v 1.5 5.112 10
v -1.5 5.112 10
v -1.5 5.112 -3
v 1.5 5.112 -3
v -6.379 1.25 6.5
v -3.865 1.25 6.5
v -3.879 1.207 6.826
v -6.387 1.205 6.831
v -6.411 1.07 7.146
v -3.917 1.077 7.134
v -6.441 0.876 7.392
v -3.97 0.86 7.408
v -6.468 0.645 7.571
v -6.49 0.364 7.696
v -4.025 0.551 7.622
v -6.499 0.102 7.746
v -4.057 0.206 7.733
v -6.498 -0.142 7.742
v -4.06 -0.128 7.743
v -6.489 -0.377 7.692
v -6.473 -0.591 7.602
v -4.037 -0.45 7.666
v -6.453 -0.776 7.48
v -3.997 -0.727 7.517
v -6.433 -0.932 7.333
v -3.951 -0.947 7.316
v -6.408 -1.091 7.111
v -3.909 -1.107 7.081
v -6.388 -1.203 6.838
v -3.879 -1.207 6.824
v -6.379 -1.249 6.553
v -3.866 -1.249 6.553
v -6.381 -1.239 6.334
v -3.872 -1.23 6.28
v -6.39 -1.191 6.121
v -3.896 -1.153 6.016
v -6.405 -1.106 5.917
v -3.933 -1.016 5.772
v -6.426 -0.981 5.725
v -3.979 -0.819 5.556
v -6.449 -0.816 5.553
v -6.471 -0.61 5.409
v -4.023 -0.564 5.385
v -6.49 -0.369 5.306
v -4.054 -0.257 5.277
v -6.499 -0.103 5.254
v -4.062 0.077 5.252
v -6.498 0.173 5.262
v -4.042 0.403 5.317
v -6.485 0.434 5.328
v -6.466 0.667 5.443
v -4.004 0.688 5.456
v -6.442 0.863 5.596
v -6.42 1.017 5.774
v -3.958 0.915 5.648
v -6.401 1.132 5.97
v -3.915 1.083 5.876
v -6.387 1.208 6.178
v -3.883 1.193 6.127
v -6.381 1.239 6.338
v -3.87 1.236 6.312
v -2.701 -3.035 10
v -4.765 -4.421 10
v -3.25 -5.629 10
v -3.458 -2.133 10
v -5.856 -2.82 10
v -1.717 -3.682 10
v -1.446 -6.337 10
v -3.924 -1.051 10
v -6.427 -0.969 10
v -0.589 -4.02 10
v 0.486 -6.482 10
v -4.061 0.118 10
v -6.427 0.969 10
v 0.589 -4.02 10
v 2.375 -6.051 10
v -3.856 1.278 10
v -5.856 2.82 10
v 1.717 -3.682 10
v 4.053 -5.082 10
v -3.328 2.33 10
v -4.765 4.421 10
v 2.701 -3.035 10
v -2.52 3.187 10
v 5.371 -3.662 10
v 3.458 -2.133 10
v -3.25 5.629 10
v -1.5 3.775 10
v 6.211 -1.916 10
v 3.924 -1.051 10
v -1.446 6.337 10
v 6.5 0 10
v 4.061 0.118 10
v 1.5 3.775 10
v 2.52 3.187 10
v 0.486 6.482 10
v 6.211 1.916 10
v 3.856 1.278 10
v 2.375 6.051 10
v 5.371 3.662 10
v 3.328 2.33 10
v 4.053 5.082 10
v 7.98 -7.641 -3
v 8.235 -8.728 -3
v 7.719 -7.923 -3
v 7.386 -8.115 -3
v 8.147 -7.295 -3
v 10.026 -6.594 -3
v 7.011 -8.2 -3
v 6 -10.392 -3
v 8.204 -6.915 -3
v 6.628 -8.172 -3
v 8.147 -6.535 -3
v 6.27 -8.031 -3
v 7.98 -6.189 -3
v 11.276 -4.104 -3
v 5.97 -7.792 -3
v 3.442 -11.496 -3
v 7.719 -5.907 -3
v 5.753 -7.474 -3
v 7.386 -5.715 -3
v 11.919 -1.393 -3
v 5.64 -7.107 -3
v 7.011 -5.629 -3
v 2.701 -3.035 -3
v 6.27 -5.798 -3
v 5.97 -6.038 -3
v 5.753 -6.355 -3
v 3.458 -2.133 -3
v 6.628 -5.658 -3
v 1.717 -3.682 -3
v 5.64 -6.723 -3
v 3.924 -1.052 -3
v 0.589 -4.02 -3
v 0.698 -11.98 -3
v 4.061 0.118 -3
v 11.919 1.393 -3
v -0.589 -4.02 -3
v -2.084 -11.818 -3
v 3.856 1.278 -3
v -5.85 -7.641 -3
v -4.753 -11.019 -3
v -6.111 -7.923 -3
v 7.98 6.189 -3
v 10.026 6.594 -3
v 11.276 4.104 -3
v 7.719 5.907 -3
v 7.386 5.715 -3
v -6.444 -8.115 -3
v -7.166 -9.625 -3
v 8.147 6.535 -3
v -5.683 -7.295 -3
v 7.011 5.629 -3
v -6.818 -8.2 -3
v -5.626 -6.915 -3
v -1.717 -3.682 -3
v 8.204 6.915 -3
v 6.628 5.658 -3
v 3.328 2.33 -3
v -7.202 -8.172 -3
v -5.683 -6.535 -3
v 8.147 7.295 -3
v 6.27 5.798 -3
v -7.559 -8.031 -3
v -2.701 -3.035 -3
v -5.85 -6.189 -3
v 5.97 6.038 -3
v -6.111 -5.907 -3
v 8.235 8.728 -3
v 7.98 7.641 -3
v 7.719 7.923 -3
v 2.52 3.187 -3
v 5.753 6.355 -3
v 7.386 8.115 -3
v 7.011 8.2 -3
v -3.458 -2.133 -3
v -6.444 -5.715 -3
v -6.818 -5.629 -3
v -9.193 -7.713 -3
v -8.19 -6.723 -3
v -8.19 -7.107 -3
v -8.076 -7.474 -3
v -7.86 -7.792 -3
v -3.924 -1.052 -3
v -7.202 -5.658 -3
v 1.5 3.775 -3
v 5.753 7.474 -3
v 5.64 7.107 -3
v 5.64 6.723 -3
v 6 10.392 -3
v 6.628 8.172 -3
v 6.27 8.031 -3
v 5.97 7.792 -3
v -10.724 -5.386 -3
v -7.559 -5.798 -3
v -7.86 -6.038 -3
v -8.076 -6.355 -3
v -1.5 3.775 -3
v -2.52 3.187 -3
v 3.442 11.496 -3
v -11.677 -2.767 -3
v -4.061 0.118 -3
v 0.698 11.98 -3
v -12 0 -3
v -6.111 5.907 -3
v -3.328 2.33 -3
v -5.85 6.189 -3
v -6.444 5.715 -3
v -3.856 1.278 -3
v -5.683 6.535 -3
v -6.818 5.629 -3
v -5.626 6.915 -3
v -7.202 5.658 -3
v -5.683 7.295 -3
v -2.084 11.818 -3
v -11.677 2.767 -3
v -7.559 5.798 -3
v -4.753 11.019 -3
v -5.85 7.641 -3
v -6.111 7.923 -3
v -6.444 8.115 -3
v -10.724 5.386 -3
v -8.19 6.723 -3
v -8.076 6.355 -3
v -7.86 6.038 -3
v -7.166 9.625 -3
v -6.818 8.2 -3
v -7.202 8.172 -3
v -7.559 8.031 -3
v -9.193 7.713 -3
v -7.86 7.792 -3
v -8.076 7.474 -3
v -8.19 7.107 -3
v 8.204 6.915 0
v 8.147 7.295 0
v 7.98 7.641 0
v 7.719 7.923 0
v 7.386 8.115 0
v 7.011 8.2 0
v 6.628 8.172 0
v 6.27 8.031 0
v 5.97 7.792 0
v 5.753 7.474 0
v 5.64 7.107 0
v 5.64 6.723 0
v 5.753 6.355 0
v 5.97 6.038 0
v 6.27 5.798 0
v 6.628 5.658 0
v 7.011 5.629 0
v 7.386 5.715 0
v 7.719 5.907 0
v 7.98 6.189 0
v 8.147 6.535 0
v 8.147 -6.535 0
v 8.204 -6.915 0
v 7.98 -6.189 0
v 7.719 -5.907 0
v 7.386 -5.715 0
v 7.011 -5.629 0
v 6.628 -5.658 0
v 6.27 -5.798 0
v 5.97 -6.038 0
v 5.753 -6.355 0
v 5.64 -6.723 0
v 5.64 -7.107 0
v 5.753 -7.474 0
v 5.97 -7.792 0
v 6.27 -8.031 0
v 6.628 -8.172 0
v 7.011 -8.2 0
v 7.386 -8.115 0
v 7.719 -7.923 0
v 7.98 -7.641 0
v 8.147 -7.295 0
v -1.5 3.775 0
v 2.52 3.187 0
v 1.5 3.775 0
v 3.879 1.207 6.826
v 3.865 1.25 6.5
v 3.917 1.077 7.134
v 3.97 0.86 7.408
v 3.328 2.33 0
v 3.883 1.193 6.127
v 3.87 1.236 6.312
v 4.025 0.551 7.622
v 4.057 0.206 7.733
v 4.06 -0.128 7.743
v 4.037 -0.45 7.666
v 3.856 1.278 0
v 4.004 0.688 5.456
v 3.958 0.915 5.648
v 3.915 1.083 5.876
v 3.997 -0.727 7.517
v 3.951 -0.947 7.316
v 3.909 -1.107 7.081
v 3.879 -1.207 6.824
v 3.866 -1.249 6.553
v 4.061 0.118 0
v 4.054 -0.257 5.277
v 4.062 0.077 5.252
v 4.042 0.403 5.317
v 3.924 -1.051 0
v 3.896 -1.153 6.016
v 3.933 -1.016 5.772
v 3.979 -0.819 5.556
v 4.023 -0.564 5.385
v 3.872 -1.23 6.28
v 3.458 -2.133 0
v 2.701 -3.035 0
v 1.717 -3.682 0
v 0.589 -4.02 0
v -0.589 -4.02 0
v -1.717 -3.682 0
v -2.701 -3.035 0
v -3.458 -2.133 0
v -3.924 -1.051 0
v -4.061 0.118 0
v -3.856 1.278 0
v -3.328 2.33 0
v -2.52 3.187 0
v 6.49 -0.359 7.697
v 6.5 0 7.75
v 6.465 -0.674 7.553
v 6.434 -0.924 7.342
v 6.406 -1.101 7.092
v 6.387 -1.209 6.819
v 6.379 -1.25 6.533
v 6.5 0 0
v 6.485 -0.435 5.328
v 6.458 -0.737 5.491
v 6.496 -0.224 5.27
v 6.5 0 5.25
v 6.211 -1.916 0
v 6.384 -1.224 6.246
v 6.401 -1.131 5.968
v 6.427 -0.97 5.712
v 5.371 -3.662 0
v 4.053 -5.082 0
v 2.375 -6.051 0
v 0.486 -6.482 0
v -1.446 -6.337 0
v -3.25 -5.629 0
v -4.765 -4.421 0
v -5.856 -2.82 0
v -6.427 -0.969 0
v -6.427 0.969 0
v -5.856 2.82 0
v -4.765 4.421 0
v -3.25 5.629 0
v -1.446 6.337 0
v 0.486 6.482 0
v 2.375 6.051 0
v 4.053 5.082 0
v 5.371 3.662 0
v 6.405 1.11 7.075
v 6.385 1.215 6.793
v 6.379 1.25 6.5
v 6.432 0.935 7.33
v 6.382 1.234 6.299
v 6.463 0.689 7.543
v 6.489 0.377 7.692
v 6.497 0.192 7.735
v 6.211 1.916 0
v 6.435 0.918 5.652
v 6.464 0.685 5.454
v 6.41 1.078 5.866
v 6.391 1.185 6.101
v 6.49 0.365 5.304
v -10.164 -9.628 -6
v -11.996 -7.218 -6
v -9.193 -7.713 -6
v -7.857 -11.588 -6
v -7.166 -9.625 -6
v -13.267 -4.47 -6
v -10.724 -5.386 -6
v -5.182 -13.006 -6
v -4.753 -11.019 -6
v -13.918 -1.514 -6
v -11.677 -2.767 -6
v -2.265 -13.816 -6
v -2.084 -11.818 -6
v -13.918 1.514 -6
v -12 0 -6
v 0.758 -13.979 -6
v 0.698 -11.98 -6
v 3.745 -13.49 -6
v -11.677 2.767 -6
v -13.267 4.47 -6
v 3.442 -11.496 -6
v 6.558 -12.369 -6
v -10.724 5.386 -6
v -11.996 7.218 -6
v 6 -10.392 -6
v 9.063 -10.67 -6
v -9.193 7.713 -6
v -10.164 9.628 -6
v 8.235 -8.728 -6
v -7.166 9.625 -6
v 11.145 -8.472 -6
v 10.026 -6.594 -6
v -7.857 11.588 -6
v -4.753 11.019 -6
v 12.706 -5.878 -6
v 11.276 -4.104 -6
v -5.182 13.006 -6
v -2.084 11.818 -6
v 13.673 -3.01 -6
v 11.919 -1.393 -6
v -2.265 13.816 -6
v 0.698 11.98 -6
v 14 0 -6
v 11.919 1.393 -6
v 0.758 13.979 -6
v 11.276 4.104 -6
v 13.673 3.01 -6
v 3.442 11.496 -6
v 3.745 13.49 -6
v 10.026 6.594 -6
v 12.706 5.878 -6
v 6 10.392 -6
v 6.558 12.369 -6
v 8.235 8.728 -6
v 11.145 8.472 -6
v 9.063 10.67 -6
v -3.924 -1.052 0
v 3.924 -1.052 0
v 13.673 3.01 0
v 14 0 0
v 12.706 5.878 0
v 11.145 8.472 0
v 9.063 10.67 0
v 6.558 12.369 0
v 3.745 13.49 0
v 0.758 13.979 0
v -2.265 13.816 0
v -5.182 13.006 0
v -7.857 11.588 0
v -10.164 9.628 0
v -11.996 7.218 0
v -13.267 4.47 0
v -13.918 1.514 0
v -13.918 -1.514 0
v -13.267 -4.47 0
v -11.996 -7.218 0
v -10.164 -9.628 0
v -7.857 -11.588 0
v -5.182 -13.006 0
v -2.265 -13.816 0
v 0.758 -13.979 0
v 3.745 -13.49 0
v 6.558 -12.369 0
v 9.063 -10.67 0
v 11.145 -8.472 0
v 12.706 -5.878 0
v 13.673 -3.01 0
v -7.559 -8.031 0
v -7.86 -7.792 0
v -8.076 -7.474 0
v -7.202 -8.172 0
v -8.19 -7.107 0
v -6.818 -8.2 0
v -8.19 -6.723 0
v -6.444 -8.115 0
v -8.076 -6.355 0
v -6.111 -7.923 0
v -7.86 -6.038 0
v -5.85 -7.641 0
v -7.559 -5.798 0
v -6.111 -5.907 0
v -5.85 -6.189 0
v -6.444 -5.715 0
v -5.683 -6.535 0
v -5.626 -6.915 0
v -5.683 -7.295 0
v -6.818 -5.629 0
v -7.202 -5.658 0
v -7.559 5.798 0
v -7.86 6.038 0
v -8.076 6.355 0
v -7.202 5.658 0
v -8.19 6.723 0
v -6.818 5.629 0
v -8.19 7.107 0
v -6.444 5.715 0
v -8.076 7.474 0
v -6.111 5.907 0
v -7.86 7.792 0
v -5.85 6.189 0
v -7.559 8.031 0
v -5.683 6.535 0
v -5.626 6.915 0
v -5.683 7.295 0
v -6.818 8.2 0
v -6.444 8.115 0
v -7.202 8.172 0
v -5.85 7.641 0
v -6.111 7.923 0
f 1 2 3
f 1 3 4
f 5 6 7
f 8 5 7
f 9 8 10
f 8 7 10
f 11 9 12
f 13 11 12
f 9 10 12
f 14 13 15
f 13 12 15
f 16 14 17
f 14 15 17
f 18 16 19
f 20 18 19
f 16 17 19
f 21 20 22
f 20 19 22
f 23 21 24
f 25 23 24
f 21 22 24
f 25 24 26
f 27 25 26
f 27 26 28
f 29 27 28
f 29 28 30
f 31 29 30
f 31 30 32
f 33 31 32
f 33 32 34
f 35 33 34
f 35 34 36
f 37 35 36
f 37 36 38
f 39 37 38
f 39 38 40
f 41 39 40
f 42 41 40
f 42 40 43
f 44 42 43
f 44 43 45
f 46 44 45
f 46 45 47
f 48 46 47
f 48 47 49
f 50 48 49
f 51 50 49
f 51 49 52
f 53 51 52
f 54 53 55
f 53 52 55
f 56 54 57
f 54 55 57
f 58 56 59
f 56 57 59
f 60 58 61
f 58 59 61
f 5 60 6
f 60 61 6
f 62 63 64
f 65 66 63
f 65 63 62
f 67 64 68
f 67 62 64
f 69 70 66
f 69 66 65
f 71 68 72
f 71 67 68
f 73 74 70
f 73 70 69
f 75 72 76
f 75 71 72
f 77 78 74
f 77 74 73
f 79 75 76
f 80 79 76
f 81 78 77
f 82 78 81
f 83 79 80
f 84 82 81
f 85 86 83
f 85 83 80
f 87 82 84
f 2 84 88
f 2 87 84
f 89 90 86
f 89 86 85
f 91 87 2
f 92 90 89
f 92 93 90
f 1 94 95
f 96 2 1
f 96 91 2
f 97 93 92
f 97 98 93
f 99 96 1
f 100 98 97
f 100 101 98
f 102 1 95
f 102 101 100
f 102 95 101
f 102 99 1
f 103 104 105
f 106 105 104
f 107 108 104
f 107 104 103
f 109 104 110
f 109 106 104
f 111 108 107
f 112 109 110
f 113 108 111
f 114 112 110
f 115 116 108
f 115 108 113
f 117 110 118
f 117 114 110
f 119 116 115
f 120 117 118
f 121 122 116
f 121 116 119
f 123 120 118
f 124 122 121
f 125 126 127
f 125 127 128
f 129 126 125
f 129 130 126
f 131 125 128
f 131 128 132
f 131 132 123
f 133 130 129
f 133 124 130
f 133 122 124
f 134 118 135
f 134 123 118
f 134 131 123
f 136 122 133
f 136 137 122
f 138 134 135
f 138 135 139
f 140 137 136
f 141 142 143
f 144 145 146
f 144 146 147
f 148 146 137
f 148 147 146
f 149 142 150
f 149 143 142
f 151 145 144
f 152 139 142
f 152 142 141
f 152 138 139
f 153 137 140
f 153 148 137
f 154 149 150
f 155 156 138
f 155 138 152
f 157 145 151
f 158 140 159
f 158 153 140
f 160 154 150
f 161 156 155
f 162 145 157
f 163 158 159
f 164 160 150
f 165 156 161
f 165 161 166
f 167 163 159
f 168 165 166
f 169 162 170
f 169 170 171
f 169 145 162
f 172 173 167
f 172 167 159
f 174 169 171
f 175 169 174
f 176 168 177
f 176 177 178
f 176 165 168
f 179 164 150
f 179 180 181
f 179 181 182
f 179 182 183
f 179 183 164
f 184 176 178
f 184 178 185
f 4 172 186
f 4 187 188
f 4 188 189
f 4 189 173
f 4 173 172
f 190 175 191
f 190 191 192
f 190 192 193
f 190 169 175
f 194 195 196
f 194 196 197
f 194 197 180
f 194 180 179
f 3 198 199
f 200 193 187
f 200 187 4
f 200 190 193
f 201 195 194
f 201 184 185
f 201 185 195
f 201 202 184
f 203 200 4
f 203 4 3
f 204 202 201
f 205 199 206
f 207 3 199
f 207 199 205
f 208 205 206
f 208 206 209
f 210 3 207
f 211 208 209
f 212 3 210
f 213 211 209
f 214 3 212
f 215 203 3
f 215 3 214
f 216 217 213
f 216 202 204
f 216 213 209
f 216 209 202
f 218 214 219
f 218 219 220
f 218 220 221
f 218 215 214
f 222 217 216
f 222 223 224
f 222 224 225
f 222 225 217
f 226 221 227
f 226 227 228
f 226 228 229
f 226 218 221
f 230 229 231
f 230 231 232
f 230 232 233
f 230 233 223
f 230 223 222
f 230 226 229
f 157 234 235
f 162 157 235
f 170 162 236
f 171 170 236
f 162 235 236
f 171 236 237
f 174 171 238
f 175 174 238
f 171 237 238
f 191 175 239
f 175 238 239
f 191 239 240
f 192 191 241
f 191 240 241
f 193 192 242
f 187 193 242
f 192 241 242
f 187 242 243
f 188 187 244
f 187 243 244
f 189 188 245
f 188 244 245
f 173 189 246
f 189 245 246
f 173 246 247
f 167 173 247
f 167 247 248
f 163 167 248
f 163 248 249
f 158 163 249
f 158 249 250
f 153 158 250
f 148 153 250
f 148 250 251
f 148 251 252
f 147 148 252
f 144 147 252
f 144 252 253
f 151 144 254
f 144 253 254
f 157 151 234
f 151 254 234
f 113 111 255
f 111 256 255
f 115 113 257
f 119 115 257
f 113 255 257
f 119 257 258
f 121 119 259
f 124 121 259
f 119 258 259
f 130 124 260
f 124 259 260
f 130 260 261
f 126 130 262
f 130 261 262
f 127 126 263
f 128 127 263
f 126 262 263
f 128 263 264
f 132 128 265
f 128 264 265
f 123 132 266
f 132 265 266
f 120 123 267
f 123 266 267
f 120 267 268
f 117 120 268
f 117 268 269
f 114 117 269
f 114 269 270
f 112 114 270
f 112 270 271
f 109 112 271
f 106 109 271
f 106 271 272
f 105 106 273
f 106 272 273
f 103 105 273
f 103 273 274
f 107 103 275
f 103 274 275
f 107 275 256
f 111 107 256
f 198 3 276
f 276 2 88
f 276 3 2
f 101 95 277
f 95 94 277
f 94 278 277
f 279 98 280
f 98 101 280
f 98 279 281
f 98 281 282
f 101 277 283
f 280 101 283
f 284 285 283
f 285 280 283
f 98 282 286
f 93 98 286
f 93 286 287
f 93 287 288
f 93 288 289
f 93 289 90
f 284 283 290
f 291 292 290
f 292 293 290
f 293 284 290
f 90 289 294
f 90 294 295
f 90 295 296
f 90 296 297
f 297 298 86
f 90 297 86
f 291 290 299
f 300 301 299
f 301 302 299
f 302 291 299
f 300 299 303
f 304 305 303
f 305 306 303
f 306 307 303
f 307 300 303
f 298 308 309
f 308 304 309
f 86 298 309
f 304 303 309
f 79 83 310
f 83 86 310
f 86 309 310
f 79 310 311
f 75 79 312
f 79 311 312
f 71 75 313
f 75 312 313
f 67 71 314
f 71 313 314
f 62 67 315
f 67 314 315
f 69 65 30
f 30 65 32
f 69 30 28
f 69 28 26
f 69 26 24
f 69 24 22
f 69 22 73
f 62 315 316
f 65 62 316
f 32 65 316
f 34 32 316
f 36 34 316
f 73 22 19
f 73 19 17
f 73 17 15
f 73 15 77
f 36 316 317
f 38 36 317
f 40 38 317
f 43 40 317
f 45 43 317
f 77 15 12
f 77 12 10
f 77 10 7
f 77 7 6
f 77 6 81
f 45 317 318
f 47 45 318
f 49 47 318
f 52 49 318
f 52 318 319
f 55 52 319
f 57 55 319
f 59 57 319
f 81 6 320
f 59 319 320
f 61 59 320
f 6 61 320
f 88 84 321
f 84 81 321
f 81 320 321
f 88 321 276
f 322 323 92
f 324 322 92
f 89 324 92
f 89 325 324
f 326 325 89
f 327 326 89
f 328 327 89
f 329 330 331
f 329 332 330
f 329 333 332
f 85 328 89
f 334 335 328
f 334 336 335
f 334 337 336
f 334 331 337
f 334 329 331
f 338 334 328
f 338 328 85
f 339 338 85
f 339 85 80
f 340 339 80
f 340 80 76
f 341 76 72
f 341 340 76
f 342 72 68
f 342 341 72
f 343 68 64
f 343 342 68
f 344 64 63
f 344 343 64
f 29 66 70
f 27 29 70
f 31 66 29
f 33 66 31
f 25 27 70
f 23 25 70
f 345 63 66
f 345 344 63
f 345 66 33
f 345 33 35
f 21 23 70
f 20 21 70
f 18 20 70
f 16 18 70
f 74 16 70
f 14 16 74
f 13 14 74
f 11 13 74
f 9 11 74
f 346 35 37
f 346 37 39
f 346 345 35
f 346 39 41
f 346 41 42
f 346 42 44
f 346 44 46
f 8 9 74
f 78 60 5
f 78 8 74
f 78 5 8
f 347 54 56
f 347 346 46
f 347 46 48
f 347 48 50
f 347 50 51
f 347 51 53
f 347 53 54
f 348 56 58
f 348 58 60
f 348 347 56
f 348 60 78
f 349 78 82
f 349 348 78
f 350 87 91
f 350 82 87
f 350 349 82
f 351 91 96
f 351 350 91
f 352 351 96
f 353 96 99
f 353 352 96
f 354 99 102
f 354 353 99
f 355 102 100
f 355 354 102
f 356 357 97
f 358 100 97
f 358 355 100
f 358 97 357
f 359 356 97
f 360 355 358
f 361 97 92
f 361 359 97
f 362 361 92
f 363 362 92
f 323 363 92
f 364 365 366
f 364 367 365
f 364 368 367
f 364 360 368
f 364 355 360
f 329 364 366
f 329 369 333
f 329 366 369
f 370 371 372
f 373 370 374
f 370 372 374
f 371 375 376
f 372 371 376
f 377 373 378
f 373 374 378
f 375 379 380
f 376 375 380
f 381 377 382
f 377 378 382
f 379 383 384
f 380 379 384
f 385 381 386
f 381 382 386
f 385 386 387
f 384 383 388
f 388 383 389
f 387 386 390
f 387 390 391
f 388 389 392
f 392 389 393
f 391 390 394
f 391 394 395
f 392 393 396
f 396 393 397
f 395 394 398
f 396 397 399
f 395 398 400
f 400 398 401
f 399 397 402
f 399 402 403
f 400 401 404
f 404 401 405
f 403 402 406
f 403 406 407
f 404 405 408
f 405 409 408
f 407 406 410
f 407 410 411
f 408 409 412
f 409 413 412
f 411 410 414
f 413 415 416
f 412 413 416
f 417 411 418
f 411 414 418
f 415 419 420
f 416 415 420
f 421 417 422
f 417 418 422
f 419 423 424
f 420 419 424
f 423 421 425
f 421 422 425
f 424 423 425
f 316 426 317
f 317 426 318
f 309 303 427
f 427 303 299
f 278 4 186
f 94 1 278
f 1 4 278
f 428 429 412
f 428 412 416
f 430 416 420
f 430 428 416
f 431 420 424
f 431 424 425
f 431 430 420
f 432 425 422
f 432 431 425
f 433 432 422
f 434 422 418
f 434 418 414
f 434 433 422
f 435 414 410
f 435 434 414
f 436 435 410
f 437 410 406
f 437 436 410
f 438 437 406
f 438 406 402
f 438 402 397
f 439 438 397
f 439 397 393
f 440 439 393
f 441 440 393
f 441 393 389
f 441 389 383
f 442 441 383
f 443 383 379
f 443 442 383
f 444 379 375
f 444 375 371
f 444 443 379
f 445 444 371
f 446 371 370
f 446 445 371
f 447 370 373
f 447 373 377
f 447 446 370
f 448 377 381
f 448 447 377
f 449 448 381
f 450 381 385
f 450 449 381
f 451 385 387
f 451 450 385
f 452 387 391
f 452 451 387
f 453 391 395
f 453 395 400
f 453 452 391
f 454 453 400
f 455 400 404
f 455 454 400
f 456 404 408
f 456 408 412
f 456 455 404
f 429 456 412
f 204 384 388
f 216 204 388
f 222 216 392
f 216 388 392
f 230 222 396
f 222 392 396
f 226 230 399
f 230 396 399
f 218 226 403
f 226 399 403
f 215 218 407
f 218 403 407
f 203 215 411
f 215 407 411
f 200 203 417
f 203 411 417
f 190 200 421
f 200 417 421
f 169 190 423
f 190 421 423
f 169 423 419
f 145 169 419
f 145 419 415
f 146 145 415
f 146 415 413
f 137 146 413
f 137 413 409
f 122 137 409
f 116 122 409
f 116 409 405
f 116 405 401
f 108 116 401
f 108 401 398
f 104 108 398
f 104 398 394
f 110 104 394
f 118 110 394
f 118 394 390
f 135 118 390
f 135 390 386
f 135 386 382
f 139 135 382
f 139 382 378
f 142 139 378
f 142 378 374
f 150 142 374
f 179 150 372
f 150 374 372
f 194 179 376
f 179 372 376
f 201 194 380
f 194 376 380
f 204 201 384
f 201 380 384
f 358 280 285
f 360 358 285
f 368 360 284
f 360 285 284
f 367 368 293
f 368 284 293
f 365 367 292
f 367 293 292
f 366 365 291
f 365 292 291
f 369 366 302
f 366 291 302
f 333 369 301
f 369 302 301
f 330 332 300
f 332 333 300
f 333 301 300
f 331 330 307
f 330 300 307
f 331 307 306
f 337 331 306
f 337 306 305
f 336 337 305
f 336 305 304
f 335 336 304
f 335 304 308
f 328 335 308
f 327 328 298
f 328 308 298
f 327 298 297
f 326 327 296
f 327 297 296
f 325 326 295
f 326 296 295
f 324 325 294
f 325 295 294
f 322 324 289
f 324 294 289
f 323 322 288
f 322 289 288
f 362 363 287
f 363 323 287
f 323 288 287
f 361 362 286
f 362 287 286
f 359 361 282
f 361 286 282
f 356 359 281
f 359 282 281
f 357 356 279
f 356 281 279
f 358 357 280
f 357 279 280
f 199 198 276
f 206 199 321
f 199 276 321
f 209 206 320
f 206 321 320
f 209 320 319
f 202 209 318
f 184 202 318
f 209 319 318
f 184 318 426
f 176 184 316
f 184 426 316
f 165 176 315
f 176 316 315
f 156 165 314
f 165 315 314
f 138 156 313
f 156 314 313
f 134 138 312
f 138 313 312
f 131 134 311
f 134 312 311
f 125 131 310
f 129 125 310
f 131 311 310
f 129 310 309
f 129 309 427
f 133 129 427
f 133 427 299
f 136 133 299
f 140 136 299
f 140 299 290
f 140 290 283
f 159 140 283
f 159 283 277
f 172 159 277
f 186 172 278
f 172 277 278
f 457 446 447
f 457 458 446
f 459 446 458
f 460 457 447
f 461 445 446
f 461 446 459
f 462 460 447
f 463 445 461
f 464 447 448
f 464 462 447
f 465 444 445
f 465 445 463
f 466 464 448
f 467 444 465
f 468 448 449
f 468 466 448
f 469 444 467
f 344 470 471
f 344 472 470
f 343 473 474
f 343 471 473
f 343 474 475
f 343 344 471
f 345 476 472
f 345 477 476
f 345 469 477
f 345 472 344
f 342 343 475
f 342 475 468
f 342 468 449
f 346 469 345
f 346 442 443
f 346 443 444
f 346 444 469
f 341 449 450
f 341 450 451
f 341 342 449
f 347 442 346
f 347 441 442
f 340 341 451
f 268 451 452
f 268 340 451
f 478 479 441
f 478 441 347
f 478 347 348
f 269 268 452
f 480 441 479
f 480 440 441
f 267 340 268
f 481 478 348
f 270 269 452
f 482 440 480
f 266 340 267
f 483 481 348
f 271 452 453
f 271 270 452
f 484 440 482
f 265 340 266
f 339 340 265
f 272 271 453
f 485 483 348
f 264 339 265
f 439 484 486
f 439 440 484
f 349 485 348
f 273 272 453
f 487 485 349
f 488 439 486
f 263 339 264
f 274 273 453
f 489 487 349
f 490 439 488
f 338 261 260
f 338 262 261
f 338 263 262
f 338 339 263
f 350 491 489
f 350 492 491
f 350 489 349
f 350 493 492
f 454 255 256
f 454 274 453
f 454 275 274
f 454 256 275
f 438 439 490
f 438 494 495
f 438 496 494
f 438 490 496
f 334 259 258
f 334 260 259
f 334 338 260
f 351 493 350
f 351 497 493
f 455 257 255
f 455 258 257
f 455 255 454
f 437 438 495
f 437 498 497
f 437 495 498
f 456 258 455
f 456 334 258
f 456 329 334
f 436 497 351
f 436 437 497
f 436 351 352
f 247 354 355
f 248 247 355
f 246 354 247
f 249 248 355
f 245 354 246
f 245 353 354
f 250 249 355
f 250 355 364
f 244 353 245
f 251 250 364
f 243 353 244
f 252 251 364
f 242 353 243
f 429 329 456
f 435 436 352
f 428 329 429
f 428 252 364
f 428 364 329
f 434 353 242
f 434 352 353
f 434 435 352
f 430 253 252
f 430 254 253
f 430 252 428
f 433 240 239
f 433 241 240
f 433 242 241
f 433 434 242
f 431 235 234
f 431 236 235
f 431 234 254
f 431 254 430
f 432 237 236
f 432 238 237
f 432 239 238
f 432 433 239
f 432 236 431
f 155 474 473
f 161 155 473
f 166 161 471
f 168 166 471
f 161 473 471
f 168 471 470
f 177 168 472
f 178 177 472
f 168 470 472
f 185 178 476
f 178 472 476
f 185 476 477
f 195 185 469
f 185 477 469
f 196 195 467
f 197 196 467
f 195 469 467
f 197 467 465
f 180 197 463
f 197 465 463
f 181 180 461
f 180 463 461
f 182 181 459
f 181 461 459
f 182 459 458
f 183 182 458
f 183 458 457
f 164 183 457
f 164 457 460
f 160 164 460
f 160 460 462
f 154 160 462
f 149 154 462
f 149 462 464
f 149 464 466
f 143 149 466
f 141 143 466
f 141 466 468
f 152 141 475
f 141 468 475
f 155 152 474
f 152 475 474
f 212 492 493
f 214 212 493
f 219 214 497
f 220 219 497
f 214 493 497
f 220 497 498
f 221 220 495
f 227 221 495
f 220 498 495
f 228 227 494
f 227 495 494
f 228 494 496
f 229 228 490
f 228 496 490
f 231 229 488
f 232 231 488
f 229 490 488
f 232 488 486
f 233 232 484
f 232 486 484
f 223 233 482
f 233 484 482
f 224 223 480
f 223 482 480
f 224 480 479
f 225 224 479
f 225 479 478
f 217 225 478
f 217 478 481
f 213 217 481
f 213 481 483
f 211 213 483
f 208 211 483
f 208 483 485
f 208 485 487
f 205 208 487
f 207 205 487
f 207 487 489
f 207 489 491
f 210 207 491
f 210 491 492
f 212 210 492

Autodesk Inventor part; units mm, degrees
ref_plane "YZ Plane" through (0, 0, 0) normal (1, 0, 0) x (0, 1, 0)
ref_plane "XZ Plane" through (0, 0, 0) normal (0, 1, 0) x (-1, 0, 0)
ref_plane "XY Plane" through (0, 0, 0) normal (0, 0, 1) x (1, 0, 0)
sketch "Hub" plane through (0, 0, 0) normal (0, 0, 1) x (1, 0, 0)
  circle A0 centre (0, 0) radius 6.6 construction
  circle A1 centre (-6.9148, 6.9148) radius 1.5875 construction
  circle A2 centre (6.9148, 6.9148) radius 1.5875 construction
  circle A3 centre (-6.9148, -6.9148) radius 1.5875 construction
  circle A4 centre (6.9148, -6.9148) radius 1.5875 construction
  line L0 (-6.9148, 6.9148) -> (6.9148, 6.9148) construction
  line L1 (6.9148, 6.9148) -> (6.9148, -6.9148) construction
  line L2 (6.9148, -6.9148) -> (-6.9148, -6.9148) construction
  line L3 (-6.9148, -6.9148) -> (-6.9148, 6.9148) construction
  circle A5 centre (0, 0) radius 12.958 construction
  line L4 (-6.9148, -6.9148) -> (6.9148, 6.9148) construction
  line L5 (-6.9148, 6.9148) -> (-5.7923, 5.7923) construction
  line L6 (-5.7923, 5.7923) -> (-4.6669, 4.6669) construction
  line L7 (-8.0373, 8.0373) -> (-9.1627, 9.1627) construction
  circle A6 centre (0, 0) radius 4.0625
  line L8 (0, 4.0625) -> (0, 5.1125) construction
  line L9 (0, -21.9812) -> (0, 19.9969) construction
  line L10 (-1.5, 5.1125) -> (1.5, 5.1125)
  line L11 (-1.5, 5.1125) -> (-1.5, 3.7754)
  line L12 (1.5, 5.1125) -> (1.5, 3.7754)
  circle A7 centre (0, 0) radius 14
  circle A8 centre (6.9148, 6.9148) radius 1.2891
  circle A9 centre (6.9148, -6.9148) radius 1.2891
  circle A10 centre (-6.9148, -6.9148) radius 1.2891
  circle A11 centre (-6.9148, 6.9148) radius 1.2891
  circle A12 centre (6.9148, -6.9148) radius 2.84 construction
  circle A13 centre (12.3744, -12.3744) radius 1.621 construction
  circle A14 centre (12.3744, -12.3744) radius 3.61 construction
  dimension "d0" = 13.2
  dimension "d1" = 3.175
  dimension "d5" = 13.8296
  dimension "d6" = 45
  dimension "d9" = 8.125
  dimension "d10" = 1.05
  dimension "d11" = 3
  dimension "d21" = 2.5781
  dimension "d27" = 28
  dimension "d34" = 5.68
  dimension "d35" = 7.22
extrude "HubFeature" add sketch "Hub" against normal blind 6
sketch "Lip" plane through (0, 0, 0) normal (0, 0, 1) x (1, 0, 0)
  circle A0 centre (0, 0) radius 6.5
  arc A1 (-1.5, 3.7754) -> (1.5, 3.7754) centre (0, 0) ccw projected
  line L0 (1.5, 5.1125) -> (1.5, 3.7754) projected
  line L1 (-1.5, 5.1125) -> (1.5, 5.1125) projected
  line L2 (-1.5, 3.7754) -> (-1.5, 5.1125) projected
  dimension "d28" = 13
extrude "LipFeature" add sketch "Lip" along normal blind 10
sketch "SetScrewHole" plane through (0, 0, 0) normal (1, 0, 0) x (0, 1, 0)
  line L0 (6.5, 10) -> (-6.5, 10) construction
  line L1 (0, 10) -> (0, 0) construction
  circle A0 centre (0, 6.5) radius 1.25
  dimension "d30" = 2.5
  dimension "d31" = 3.5
extrude "SetScrewHoleFeature" cut sketch "SetScrewHole" along normal through all both and the other way through all
sketch "Sketch7" plane through (0, 0, -6) normal (0, 0, -1) x (-1, 0, 0)
  circle A0 centre (0, 0) radius 14 projected
  circle A1 centre (0, 0) radius 12
  dimension "d38" = 24
extrude "Extrusion6" cut sketch "Sketch7" against normal blind 3 contours A1
properties part number "BaseHub"
